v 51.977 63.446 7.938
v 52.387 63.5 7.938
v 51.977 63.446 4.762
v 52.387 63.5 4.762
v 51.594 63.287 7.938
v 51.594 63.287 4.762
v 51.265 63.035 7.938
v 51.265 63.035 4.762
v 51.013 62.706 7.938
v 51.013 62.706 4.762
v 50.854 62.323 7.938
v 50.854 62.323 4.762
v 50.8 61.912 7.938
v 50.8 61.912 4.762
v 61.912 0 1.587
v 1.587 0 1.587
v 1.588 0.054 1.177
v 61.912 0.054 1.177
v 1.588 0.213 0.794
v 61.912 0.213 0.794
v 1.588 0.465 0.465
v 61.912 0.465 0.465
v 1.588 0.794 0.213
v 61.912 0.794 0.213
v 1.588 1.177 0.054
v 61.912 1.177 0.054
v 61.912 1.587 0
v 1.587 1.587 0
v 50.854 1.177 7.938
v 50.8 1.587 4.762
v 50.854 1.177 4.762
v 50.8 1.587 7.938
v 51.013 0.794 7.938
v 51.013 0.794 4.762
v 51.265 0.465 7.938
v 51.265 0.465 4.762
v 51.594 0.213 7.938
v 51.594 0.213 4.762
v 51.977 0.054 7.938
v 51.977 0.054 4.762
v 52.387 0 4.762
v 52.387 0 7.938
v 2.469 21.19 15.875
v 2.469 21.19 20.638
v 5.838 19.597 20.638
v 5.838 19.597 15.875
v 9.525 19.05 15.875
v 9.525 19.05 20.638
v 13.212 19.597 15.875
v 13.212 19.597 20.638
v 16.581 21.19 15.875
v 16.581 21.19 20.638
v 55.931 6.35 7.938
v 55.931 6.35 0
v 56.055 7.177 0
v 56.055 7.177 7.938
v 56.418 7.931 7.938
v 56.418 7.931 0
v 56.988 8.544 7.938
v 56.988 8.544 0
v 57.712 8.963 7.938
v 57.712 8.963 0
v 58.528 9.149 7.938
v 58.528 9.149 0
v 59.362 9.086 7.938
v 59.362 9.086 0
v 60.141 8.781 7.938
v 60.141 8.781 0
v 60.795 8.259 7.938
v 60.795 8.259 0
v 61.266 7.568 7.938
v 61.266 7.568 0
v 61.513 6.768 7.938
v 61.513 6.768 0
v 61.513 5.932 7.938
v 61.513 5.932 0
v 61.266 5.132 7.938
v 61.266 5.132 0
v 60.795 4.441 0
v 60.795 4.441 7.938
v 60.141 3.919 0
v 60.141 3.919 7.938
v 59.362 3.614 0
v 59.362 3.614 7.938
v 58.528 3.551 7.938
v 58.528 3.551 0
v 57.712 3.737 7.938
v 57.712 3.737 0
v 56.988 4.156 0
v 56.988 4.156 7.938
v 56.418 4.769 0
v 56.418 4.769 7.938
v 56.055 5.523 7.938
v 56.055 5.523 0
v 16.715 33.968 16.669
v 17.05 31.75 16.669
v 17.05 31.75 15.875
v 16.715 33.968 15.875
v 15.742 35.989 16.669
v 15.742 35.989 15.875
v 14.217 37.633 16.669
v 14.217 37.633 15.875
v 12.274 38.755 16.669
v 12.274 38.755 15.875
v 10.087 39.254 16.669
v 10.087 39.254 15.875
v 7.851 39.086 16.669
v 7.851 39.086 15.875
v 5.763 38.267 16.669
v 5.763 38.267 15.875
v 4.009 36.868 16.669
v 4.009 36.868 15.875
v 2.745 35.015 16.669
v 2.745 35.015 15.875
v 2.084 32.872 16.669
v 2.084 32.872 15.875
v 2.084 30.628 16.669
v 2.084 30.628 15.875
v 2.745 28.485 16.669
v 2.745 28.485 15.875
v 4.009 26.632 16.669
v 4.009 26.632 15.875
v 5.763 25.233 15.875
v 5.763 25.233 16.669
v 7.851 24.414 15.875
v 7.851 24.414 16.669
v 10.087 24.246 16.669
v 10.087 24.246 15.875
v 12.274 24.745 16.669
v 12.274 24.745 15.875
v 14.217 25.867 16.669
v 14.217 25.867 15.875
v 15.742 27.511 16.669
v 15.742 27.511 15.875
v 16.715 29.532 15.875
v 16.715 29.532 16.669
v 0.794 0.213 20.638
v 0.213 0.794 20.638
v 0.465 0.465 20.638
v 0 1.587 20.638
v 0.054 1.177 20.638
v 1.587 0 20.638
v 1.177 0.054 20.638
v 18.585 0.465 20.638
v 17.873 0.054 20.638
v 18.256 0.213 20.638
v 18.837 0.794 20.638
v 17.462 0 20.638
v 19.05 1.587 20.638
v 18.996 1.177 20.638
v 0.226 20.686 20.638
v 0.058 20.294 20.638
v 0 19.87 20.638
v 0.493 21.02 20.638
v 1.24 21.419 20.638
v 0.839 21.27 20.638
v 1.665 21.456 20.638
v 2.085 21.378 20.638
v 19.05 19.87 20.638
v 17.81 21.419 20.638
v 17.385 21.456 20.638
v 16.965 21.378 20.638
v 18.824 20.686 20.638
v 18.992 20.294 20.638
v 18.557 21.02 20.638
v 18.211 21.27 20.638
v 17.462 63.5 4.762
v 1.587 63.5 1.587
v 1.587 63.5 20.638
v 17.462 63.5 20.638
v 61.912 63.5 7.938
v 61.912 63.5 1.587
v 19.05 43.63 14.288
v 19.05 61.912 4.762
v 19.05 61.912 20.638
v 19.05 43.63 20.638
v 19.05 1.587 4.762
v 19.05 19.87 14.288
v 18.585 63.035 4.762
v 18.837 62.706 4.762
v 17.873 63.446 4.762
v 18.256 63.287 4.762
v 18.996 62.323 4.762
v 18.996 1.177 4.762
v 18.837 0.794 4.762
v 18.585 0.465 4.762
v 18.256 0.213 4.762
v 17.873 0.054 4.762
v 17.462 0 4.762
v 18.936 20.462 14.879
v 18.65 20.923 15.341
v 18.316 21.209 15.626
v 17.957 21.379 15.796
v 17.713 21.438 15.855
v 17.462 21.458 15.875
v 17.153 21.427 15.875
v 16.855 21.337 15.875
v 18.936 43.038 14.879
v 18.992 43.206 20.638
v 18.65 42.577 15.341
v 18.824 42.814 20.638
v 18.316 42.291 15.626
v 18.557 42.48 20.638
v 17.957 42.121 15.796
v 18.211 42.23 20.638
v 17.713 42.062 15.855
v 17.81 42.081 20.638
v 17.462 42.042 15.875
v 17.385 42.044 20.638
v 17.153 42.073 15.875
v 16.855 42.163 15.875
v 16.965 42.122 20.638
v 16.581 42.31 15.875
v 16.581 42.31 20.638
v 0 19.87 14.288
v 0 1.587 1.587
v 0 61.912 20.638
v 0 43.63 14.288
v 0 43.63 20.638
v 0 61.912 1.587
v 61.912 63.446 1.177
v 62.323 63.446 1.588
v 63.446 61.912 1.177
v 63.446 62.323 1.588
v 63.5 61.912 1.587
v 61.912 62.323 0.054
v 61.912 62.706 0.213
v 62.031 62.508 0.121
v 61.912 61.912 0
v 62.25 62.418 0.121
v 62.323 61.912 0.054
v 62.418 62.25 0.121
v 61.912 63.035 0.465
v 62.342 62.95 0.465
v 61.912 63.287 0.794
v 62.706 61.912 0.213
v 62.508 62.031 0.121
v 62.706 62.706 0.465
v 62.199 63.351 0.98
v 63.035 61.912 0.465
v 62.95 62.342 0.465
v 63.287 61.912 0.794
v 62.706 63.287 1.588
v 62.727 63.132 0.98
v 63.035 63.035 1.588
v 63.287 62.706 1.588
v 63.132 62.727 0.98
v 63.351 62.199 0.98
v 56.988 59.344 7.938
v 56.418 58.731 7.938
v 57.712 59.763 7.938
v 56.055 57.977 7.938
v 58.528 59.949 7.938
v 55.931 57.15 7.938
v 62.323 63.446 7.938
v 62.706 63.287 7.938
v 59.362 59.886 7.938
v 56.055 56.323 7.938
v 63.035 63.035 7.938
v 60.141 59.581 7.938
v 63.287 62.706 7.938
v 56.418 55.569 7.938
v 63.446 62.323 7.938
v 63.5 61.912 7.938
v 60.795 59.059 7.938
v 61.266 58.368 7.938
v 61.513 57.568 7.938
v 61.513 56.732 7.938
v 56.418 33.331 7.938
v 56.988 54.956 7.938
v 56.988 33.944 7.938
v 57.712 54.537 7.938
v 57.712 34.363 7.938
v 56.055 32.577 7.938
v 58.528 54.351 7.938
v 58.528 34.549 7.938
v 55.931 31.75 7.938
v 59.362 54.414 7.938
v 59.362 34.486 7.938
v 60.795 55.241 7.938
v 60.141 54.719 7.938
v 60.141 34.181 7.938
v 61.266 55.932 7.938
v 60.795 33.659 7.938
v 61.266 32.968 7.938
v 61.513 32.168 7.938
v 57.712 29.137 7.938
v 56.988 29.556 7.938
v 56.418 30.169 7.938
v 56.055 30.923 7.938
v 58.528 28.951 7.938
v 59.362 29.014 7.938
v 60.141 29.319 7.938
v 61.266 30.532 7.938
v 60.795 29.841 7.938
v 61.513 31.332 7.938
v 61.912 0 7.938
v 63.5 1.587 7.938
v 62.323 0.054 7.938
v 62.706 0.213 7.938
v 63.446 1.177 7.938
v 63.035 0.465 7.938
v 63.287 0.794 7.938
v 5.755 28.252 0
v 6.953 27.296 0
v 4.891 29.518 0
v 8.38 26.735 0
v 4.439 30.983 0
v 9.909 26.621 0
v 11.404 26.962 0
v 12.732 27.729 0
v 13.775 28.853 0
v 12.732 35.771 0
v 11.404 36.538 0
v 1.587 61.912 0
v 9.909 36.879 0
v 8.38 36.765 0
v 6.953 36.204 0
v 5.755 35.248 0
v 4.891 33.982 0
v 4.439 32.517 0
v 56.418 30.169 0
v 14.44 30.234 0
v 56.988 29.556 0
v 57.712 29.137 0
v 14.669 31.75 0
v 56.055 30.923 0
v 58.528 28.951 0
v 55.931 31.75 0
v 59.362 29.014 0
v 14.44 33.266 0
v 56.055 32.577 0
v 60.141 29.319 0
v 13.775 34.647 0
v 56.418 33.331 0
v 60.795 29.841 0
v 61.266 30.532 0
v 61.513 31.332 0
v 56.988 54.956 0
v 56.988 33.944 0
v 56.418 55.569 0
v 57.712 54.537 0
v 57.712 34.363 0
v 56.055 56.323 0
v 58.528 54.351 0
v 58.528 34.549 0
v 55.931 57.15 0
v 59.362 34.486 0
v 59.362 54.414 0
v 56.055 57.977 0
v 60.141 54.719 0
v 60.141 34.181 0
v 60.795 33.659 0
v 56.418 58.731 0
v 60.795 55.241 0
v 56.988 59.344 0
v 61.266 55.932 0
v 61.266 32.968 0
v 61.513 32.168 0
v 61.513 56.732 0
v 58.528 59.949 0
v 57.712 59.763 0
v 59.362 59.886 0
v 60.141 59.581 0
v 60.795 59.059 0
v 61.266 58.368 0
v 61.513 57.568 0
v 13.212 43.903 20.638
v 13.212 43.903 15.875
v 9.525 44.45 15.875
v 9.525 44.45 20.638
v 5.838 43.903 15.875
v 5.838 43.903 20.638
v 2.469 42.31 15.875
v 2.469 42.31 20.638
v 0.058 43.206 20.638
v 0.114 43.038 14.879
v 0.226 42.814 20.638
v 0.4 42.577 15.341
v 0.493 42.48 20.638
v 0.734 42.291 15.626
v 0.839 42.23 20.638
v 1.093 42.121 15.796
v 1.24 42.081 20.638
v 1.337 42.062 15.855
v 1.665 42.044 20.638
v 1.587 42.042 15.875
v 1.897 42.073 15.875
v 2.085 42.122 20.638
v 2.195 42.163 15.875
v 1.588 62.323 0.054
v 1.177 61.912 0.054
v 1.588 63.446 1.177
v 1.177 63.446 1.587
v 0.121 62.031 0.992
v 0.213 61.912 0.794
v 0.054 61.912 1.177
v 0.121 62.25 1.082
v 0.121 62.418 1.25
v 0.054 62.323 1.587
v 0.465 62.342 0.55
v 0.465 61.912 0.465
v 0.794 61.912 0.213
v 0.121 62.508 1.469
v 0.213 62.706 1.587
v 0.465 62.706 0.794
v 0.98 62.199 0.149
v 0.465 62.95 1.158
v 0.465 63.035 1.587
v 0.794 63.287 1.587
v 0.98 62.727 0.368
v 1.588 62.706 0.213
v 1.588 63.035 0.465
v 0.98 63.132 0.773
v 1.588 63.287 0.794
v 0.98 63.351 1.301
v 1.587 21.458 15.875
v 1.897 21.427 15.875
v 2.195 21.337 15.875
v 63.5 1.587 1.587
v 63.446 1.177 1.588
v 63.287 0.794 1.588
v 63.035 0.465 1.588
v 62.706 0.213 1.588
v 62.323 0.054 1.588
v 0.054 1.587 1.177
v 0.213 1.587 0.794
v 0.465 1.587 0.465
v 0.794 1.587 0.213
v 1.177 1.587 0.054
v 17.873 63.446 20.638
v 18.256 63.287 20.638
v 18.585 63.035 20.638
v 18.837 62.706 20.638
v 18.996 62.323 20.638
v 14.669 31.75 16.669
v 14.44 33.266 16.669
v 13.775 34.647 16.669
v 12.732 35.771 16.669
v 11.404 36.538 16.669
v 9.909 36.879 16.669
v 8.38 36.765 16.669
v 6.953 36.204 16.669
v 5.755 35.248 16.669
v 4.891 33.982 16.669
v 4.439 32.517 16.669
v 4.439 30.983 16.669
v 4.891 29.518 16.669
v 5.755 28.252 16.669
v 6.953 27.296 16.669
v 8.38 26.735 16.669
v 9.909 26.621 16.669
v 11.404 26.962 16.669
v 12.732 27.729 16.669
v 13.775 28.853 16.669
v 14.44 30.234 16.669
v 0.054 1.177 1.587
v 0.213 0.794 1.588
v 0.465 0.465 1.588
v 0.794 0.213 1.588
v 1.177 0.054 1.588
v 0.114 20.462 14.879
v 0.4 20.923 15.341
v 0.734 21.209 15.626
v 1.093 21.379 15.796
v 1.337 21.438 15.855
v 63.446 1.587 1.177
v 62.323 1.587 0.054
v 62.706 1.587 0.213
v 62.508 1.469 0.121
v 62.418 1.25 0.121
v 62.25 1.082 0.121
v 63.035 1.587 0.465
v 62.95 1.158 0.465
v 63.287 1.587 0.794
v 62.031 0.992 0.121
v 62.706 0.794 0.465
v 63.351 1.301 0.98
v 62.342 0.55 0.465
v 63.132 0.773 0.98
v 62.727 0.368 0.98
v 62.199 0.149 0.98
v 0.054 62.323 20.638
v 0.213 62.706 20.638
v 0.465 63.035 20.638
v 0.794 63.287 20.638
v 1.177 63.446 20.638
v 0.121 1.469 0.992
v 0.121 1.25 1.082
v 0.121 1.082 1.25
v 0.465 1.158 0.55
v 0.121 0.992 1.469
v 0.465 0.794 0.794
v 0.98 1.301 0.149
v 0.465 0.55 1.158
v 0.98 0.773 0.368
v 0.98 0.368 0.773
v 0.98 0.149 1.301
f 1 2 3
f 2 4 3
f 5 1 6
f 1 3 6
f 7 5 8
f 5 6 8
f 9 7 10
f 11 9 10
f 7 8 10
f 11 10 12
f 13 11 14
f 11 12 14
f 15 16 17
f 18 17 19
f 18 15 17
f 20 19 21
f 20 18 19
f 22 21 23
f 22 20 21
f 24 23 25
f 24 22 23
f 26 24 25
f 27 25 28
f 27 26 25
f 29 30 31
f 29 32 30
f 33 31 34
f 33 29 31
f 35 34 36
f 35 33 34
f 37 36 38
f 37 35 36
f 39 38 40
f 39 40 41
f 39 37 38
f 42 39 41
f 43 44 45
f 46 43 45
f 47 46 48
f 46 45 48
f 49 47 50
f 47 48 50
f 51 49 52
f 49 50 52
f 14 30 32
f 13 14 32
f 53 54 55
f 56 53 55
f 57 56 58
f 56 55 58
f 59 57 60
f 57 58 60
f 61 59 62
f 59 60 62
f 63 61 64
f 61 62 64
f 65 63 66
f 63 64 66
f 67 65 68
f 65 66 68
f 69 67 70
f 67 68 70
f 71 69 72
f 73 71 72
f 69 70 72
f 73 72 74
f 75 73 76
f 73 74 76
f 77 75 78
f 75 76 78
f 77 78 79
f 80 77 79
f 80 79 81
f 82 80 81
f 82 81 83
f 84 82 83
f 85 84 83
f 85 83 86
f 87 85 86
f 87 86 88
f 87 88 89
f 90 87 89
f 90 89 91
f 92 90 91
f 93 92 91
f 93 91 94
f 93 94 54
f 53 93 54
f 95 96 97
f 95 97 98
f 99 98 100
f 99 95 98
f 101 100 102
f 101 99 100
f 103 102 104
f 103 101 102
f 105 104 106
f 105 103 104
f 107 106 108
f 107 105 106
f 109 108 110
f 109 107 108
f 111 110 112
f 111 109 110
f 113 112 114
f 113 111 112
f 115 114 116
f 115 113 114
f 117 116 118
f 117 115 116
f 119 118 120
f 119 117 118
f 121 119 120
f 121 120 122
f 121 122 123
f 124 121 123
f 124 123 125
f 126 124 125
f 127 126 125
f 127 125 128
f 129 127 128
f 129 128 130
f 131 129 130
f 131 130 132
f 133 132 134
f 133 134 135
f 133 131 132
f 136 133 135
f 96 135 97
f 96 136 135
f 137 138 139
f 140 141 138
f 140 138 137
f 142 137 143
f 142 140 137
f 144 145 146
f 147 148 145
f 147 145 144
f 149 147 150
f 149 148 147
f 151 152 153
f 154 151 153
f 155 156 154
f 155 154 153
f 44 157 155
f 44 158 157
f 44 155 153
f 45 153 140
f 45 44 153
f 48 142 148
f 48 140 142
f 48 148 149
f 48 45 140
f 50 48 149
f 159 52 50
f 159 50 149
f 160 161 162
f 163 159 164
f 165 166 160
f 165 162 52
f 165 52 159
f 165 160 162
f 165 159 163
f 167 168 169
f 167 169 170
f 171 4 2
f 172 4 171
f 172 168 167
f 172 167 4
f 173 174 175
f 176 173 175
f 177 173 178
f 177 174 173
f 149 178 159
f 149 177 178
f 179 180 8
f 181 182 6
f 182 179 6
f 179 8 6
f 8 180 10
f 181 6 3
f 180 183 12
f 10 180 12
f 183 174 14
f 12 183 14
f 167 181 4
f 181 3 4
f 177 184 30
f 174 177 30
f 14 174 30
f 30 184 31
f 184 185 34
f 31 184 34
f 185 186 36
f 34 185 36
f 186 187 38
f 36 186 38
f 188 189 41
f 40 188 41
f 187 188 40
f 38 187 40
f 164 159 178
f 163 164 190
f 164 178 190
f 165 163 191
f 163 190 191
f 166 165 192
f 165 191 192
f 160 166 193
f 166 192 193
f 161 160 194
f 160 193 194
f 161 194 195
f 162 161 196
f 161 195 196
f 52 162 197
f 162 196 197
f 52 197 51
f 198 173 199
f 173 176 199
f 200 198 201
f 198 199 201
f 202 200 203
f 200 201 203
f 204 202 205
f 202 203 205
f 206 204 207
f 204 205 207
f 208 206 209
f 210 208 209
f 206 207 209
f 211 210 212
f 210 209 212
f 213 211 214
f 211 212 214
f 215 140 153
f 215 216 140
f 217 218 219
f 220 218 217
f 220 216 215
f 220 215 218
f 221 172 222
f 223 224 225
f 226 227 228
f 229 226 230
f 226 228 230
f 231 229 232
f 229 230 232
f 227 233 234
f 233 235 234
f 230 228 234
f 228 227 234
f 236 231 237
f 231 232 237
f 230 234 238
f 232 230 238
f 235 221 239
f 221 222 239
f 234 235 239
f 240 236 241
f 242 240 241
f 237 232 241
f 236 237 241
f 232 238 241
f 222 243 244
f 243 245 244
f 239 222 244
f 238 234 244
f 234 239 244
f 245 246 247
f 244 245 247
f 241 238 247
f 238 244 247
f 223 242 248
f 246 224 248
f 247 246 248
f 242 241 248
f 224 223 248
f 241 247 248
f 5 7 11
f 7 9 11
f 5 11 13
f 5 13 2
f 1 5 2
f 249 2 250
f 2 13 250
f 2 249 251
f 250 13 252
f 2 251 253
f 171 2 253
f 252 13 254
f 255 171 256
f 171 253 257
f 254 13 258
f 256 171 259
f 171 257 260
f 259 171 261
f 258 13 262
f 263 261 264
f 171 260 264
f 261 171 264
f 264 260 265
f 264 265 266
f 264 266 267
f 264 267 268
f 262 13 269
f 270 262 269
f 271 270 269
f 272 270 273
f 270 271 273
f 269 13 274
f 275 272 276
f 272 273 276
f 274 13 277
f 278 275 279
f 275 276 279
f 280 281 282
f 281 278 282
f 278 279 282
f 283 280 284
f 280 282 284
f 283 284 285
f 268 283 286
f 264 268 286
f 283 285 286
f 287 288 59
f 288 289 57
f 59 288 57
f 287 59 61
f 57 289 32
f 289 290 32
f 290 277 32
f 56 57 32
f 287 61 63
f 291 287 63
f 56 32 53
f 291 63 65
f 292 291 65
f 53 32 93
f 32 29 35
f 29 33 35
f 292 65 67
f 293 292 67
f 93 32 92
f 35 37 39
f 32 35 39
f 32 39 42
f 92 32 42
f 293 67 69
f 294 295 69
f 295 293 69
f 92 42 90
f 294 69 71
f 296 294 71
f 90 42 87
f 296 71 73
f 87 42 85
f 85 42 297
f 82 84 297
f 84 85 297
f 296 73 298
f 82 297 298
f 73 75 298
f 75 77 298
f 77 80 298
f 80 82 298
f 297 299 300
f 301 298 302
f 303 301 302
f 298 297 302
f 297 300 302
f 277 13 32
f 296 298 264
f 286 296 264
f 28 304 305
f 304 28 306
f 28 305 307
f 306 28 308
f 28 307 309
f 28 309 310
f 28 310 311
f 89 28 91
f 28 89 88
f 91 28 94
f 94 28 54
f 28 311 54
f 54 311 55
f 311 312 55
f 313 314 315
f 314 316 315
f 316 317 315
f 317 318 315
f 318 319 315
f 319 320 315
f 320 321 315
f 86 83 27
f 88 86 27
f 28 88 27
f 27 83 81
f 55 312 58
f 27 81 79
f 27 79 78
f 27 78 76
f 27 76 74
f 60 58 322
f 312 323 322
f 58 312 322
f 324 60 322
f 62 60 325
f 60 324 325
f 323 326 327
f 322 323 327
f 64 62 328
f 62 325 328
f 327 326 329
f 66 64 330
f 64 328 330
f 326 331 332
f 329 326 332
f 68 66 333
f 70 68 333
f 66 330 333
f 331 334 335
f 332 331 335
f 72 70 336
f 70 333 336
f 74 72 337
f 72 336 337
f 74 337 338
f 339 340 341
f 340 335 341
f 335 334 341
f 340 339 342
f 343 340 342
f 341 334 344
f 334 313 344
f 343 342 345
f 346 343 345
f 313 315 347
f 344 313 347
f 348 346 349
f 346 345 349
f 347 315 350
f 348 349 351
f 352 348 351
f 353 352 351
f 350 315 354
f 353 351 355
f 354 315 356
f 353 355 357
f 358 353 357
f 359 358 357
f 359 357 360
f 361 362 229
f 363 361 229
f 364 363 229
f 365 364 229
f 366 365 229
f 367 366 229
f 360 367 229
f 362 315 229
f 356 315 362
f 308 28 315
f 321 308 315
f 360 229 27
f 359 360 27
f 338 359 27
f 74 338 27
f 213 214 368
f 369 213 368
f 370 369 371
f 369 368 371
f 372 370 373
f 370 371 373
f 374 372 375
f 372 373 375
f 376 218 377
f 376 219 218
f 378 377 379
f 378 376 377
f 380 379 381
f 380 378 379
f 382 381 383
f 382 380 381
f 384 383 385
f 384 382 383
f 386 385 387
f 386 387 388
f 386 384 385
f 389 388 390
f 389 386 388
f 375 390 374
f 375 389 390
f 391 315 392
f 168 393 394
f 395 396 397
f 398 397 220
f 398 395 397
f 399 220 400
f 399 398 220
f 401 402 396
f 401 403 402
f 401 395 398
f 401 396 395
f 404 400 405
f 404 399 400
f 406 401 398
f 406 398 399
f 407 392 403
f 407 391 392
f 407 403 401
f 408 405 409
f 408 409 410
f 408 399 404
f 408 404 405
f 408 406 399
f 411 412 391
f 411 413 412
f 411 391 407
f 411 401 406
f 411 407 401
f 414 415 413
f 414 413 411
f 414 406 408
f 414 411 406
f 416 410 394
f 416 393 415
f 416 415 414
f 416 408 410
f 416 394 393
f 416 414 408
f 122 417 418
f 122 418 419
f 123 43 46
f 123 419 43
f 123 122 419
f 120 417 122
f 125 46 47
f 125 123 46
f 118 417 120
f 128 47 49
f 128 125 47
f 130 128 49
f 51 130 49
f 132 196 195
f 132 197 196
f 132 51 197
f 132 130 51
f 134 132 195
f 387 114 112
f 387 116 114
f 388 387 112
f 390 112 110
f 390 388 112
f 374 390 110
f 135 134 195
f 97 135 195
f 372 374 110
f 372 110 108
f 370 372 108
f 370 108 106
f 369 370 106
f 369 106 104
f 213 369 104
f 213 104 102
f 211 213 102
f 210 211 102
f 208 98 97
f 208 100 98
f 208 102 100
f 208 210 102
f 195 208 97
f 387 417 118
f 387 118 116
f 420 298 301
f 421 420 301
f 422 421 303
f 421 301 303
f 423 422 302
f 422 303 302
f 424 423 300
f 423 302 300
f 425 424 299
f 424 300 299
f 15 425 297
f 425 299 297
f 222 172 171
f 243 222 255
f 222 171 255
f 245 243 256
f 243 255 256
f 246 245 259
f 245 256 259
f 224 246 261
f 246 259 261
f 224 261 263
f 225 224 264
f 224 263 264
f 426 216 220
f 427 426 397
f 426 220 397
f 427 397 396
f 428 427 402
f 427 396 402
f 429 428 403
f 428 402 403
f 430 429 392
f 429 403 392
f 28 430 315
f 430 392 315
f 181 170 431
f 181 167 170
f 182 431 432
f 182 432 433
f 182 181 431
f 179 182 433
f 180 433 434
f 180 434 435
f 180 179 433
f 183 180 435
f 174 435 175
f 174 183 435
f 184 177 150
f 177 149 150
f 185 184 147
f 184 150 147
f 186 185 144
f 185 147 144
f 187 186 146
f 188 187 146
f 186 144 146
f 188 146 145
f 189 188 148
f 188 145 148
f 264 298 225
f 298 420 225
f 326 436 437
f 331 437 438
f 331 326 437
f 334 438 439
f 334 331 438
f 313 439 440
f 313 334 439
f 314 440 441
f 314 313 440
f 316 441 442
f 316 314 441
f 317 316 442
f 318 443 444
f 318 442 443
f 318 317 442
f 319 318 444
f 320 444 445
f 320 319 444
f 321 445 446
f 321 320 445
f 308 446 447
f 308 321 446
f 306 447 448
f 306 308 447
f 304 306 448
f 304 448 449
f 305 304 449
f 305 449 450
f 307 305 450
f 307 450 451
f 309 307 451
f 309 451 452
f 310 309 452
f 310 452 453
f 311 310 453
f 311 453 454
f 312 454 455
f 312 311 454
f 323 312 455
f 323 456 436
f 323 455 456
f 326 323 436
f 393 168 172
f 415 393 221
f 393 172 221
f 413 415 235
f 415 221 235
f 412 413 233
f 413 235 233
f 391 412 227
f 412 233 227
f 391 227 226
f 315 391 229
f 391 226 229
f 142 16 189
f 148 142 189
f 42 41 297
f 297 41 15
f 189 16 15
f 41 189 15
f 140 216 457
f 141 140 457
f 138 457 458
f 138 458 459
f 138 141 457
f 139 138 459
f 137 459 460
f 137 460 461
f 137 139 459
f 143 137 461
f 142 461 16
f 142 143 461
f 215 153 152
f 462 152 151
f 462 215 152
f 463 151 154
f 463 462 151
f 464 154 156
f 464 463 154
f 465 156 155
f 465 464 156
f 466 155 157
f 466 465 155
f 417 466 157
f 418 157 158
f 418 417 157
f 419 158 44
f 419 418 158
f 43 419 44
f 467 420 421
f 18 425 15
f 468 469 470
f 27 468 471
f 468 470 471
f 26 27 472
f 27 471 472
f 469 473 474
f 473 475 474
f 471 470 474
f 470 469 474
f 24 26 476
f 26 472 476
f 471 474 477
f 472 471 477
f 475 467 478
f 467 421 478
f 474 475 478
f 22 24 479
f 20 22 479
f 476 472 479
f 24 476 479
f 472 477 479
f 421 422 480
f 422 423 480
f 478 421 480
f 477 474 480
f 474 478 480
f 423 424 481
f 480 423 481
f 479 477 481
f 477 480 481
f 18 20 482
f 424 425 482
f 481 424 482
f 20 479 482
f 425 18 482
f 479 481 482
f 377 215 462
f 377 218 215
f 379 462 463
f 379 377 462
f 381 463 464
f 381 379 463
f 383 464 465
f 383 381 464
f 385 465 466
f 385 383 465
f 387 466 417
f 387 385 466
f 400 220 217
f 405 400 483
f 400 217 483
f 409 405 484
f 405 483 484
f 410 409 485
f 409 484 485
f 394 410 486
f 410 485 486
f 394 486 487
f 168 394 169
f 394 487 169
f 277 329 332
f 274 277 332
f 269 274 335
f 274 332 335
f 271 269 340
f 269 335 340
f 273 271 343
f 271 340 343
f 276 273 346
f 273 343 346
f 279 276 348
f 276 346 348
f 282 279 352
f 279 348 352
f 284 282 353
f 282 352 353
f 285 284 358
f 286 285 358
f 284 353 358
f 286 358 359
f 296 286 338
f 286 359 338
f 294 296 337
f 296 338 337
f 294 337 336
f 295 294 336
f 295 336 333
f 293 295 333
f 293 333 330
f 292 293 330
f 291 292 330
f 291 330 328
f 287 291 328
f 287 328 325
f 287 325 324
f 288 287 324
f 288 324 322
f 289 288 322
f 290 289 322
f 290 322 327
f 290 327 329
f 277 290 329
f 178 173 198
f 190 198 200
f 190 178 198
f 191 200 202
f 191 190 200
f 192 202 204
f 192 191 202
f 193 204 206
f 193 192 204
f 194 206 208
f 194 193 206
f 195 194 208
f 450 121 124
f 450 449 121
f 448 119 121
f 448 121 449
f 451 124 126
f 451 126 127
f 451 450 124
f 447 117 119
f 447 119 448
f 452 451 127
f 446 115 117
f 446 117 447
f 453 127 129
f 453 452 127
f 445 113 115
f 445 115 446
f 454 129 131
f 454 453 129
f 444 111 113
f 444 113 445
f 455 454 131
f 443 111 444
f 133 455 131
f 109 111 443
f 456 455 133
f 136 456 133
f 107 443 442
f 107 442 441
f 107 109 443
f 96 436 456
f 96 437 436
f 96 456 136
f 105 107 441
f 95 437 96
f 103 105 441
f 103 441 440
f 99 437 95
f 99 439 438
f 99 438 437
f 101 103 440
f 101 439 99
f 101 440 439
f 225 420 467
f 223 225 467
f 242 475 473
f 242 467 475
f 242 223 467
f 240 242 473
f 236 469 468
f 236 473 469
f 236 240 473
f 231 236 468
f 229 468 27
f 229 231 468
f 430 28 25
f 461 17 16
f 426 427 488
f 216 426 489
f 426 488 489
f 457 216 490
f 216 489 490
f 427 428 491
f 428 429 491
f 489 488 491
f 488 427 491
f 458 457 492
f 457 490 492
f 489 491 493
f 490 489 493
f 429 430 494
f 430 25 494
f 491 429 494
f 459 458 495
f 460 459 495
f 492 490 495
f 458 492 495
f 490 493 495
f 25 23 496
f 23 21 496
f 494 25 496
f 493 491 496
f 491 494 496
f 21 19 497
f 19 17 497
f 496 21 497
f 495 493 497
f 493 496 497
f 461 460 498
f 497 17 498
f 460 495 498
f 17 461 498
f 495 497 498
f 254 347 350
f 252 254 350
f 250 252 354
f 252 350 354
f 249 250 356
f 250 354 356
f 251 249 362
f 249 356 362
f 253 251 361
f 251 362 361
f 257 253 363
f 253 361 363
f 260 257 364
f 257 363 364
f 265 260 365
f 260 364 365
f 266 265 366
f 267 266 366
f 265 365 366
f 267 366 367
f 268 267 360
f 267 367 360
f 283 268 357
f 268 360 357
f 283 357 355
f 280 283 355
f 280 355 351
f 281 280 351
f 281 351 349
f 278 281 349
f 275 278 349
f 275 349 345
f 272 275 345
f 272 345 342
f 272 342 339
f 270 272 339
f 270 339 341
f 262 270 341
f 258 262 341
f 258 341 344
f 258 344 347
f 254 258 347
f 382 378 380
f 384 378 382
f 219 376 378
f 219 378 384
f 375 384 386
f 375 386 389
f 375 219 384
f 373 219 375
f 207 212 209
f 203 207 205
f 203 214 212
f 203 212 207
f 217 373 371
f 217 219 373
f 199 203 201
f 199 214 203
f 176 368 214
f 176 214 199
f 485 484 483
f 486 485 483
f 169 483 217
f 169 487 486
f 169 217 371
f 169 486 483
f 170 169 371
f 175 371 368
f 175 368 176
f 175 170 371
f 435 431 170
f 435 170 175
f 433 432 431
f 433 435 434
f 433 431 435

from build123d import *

# Parameters (mm, degrees)
SKETCH2_W                  = 63.5
SKETCH2_H                  = 63.5
SKETCH2_R                  = 5.1435
BOSS_EXTRUDE1_DEPTH        = 20.6375
SKETCH3_W                  = 31.75
SKETCH3_H                  = 15.875
CUT_EXTRUDE1_DEPTH         = 93.143401317
SKETCH4_W                  = 12.7
SKETCH4_H                  = 12.7
CUT_EXTRUDE2_DEPTH         = 93.143401317
SKETCH5_R                  = 12.7
CUT_EXTRUDE3_DEPTH         = 3.96875
SKETCH6_R                  = 12.7
SKETCH6_R_2                = 7.52475
CUT_EXTRUDE4_DEPTH         = 0.79375
FILLET1_R                  = 1.5875
F_10_CLEARANCE_HOLE1_D     = 5.6134
F_10_CLEARANCE_HOLE1_DEPTH = 25.4
F_10_CLEARANCE_HOLE1_TIP   = 1.686435499


with BuildPart() as part:
    # Sketch2 → Boss-Extrude1 (new body)
    with BuildSketch(Plane.XY):
        with Locations((31.75, 31.75)):
            Rectangle(SKETCH2_W, SKETCH2_H)
        with Locations((9.525, 31.75)):
            Circle(SKETCH2_R, mode=Mode.SUBTRACT)
    extrude(amount=BOSS_EXTRUDE1_DEPTH)

    # Sketch3 → Cut-Extrude1 (cut, through all)
    with BuildSketch(Plane.XZ):
        with Locations((34.925, 12.7)):
            Rectangle(SKETCH3_W, SKETCH3_H)
    extrude(amount=-CUT_EXTRUDE1_DEPTH, mode=Mode.SUBTRACT)

    # Sketch4 → Cut-Extrude2 (cut, through all)
    with BuildSketch(Plane.XZ):
        with Locations((57.15, 14.2875)):
            Rectangle(SKETCH4_W, SKETCH4_H)
    extrude(amount=-CUT_EXTRUDE2_DEPTH, mode=Mode.SUBTRACT)

    # Sketch5 → Cut-Extrude3 (cut)
    with BuildSketch(Plane.XY.offset(20.6375)):
        with Locations((9.525, 31.75)):
            Circle(SKETCH5_R)
    extrude(amount=-CUT_EXTRUDE3_DEPTH, mode=Mode.SUBTRACT)

    # Sketch6 → Cut-Extrude4 (cut)
    with BuildSketch(Plane.XY.offset(16.66875)):
        with Locations((9.525, 31.75)):
            Circle(SKETCH6_R)
        with Locations((9.525, 31.75)):
            Circle(SKETCH6_R_2, mode=Mode.SUBTRACT)
    extrude(amount=-CUT_EXTRUDE4_DEPTH, mode=Mode.SUBTRACT)

    # Fillet1
    fillet1_edges = [part.edges().sort_by_distance(p)[0] for p in [
        (19.05, 63.5, 12.7),
        (50.8, 63.5, 6.35),
        (19.05, 0, 12.7),
        (50.8, 0, 6.35),
        (63.5, 63.5, 3.96875),
        (63.5, 0, 3.96875),
        (31.75, 63.5, 0),
        (63.5, 31.75, 0),
        (19.05, 40.150260413, 18.25625),
        (19.05, 23.349739587, 18.25625),
        (31.75, 0, 0),
        (0, 40.150260413, 18.25625),
        (0, 23.349739587, 18.25625),
        (0, 31.75, 0),
        (19.05, 31.75, 15.875),
        (0, 31.75, 15.875),
        (0, 63.5, 10.31875),
        (0, 0, 10.31875),
    ]]
    fillet(fillet1_edges, radius=FILLET1_R)

    # #10 Clearance Hole1
    with Locations(Plane.XY.offset(20.6375)):
        with Locations((58.7375, 6.35), (58.7375, 31.75), (58.7375, 57.15)):
            Hole(F_10_CLEARANCE_HOLE1_D / 2, depth=F_10_CLEARANCE_HOLE1_DEPTH)
            with Locations((0, 0, -(F_10_CLEARANCE_HOLE1_DEPTH + F_10_CLEARANCE_HOLE1_TIP / 2))):  # 118° drill point
                Cone(0, F_10_CLEARANCE_HOLE1_D / 2, F_10_CLEARANCE_HOLE1_TIP, mode=Mode.SUBTRACT)


solid = part.part
